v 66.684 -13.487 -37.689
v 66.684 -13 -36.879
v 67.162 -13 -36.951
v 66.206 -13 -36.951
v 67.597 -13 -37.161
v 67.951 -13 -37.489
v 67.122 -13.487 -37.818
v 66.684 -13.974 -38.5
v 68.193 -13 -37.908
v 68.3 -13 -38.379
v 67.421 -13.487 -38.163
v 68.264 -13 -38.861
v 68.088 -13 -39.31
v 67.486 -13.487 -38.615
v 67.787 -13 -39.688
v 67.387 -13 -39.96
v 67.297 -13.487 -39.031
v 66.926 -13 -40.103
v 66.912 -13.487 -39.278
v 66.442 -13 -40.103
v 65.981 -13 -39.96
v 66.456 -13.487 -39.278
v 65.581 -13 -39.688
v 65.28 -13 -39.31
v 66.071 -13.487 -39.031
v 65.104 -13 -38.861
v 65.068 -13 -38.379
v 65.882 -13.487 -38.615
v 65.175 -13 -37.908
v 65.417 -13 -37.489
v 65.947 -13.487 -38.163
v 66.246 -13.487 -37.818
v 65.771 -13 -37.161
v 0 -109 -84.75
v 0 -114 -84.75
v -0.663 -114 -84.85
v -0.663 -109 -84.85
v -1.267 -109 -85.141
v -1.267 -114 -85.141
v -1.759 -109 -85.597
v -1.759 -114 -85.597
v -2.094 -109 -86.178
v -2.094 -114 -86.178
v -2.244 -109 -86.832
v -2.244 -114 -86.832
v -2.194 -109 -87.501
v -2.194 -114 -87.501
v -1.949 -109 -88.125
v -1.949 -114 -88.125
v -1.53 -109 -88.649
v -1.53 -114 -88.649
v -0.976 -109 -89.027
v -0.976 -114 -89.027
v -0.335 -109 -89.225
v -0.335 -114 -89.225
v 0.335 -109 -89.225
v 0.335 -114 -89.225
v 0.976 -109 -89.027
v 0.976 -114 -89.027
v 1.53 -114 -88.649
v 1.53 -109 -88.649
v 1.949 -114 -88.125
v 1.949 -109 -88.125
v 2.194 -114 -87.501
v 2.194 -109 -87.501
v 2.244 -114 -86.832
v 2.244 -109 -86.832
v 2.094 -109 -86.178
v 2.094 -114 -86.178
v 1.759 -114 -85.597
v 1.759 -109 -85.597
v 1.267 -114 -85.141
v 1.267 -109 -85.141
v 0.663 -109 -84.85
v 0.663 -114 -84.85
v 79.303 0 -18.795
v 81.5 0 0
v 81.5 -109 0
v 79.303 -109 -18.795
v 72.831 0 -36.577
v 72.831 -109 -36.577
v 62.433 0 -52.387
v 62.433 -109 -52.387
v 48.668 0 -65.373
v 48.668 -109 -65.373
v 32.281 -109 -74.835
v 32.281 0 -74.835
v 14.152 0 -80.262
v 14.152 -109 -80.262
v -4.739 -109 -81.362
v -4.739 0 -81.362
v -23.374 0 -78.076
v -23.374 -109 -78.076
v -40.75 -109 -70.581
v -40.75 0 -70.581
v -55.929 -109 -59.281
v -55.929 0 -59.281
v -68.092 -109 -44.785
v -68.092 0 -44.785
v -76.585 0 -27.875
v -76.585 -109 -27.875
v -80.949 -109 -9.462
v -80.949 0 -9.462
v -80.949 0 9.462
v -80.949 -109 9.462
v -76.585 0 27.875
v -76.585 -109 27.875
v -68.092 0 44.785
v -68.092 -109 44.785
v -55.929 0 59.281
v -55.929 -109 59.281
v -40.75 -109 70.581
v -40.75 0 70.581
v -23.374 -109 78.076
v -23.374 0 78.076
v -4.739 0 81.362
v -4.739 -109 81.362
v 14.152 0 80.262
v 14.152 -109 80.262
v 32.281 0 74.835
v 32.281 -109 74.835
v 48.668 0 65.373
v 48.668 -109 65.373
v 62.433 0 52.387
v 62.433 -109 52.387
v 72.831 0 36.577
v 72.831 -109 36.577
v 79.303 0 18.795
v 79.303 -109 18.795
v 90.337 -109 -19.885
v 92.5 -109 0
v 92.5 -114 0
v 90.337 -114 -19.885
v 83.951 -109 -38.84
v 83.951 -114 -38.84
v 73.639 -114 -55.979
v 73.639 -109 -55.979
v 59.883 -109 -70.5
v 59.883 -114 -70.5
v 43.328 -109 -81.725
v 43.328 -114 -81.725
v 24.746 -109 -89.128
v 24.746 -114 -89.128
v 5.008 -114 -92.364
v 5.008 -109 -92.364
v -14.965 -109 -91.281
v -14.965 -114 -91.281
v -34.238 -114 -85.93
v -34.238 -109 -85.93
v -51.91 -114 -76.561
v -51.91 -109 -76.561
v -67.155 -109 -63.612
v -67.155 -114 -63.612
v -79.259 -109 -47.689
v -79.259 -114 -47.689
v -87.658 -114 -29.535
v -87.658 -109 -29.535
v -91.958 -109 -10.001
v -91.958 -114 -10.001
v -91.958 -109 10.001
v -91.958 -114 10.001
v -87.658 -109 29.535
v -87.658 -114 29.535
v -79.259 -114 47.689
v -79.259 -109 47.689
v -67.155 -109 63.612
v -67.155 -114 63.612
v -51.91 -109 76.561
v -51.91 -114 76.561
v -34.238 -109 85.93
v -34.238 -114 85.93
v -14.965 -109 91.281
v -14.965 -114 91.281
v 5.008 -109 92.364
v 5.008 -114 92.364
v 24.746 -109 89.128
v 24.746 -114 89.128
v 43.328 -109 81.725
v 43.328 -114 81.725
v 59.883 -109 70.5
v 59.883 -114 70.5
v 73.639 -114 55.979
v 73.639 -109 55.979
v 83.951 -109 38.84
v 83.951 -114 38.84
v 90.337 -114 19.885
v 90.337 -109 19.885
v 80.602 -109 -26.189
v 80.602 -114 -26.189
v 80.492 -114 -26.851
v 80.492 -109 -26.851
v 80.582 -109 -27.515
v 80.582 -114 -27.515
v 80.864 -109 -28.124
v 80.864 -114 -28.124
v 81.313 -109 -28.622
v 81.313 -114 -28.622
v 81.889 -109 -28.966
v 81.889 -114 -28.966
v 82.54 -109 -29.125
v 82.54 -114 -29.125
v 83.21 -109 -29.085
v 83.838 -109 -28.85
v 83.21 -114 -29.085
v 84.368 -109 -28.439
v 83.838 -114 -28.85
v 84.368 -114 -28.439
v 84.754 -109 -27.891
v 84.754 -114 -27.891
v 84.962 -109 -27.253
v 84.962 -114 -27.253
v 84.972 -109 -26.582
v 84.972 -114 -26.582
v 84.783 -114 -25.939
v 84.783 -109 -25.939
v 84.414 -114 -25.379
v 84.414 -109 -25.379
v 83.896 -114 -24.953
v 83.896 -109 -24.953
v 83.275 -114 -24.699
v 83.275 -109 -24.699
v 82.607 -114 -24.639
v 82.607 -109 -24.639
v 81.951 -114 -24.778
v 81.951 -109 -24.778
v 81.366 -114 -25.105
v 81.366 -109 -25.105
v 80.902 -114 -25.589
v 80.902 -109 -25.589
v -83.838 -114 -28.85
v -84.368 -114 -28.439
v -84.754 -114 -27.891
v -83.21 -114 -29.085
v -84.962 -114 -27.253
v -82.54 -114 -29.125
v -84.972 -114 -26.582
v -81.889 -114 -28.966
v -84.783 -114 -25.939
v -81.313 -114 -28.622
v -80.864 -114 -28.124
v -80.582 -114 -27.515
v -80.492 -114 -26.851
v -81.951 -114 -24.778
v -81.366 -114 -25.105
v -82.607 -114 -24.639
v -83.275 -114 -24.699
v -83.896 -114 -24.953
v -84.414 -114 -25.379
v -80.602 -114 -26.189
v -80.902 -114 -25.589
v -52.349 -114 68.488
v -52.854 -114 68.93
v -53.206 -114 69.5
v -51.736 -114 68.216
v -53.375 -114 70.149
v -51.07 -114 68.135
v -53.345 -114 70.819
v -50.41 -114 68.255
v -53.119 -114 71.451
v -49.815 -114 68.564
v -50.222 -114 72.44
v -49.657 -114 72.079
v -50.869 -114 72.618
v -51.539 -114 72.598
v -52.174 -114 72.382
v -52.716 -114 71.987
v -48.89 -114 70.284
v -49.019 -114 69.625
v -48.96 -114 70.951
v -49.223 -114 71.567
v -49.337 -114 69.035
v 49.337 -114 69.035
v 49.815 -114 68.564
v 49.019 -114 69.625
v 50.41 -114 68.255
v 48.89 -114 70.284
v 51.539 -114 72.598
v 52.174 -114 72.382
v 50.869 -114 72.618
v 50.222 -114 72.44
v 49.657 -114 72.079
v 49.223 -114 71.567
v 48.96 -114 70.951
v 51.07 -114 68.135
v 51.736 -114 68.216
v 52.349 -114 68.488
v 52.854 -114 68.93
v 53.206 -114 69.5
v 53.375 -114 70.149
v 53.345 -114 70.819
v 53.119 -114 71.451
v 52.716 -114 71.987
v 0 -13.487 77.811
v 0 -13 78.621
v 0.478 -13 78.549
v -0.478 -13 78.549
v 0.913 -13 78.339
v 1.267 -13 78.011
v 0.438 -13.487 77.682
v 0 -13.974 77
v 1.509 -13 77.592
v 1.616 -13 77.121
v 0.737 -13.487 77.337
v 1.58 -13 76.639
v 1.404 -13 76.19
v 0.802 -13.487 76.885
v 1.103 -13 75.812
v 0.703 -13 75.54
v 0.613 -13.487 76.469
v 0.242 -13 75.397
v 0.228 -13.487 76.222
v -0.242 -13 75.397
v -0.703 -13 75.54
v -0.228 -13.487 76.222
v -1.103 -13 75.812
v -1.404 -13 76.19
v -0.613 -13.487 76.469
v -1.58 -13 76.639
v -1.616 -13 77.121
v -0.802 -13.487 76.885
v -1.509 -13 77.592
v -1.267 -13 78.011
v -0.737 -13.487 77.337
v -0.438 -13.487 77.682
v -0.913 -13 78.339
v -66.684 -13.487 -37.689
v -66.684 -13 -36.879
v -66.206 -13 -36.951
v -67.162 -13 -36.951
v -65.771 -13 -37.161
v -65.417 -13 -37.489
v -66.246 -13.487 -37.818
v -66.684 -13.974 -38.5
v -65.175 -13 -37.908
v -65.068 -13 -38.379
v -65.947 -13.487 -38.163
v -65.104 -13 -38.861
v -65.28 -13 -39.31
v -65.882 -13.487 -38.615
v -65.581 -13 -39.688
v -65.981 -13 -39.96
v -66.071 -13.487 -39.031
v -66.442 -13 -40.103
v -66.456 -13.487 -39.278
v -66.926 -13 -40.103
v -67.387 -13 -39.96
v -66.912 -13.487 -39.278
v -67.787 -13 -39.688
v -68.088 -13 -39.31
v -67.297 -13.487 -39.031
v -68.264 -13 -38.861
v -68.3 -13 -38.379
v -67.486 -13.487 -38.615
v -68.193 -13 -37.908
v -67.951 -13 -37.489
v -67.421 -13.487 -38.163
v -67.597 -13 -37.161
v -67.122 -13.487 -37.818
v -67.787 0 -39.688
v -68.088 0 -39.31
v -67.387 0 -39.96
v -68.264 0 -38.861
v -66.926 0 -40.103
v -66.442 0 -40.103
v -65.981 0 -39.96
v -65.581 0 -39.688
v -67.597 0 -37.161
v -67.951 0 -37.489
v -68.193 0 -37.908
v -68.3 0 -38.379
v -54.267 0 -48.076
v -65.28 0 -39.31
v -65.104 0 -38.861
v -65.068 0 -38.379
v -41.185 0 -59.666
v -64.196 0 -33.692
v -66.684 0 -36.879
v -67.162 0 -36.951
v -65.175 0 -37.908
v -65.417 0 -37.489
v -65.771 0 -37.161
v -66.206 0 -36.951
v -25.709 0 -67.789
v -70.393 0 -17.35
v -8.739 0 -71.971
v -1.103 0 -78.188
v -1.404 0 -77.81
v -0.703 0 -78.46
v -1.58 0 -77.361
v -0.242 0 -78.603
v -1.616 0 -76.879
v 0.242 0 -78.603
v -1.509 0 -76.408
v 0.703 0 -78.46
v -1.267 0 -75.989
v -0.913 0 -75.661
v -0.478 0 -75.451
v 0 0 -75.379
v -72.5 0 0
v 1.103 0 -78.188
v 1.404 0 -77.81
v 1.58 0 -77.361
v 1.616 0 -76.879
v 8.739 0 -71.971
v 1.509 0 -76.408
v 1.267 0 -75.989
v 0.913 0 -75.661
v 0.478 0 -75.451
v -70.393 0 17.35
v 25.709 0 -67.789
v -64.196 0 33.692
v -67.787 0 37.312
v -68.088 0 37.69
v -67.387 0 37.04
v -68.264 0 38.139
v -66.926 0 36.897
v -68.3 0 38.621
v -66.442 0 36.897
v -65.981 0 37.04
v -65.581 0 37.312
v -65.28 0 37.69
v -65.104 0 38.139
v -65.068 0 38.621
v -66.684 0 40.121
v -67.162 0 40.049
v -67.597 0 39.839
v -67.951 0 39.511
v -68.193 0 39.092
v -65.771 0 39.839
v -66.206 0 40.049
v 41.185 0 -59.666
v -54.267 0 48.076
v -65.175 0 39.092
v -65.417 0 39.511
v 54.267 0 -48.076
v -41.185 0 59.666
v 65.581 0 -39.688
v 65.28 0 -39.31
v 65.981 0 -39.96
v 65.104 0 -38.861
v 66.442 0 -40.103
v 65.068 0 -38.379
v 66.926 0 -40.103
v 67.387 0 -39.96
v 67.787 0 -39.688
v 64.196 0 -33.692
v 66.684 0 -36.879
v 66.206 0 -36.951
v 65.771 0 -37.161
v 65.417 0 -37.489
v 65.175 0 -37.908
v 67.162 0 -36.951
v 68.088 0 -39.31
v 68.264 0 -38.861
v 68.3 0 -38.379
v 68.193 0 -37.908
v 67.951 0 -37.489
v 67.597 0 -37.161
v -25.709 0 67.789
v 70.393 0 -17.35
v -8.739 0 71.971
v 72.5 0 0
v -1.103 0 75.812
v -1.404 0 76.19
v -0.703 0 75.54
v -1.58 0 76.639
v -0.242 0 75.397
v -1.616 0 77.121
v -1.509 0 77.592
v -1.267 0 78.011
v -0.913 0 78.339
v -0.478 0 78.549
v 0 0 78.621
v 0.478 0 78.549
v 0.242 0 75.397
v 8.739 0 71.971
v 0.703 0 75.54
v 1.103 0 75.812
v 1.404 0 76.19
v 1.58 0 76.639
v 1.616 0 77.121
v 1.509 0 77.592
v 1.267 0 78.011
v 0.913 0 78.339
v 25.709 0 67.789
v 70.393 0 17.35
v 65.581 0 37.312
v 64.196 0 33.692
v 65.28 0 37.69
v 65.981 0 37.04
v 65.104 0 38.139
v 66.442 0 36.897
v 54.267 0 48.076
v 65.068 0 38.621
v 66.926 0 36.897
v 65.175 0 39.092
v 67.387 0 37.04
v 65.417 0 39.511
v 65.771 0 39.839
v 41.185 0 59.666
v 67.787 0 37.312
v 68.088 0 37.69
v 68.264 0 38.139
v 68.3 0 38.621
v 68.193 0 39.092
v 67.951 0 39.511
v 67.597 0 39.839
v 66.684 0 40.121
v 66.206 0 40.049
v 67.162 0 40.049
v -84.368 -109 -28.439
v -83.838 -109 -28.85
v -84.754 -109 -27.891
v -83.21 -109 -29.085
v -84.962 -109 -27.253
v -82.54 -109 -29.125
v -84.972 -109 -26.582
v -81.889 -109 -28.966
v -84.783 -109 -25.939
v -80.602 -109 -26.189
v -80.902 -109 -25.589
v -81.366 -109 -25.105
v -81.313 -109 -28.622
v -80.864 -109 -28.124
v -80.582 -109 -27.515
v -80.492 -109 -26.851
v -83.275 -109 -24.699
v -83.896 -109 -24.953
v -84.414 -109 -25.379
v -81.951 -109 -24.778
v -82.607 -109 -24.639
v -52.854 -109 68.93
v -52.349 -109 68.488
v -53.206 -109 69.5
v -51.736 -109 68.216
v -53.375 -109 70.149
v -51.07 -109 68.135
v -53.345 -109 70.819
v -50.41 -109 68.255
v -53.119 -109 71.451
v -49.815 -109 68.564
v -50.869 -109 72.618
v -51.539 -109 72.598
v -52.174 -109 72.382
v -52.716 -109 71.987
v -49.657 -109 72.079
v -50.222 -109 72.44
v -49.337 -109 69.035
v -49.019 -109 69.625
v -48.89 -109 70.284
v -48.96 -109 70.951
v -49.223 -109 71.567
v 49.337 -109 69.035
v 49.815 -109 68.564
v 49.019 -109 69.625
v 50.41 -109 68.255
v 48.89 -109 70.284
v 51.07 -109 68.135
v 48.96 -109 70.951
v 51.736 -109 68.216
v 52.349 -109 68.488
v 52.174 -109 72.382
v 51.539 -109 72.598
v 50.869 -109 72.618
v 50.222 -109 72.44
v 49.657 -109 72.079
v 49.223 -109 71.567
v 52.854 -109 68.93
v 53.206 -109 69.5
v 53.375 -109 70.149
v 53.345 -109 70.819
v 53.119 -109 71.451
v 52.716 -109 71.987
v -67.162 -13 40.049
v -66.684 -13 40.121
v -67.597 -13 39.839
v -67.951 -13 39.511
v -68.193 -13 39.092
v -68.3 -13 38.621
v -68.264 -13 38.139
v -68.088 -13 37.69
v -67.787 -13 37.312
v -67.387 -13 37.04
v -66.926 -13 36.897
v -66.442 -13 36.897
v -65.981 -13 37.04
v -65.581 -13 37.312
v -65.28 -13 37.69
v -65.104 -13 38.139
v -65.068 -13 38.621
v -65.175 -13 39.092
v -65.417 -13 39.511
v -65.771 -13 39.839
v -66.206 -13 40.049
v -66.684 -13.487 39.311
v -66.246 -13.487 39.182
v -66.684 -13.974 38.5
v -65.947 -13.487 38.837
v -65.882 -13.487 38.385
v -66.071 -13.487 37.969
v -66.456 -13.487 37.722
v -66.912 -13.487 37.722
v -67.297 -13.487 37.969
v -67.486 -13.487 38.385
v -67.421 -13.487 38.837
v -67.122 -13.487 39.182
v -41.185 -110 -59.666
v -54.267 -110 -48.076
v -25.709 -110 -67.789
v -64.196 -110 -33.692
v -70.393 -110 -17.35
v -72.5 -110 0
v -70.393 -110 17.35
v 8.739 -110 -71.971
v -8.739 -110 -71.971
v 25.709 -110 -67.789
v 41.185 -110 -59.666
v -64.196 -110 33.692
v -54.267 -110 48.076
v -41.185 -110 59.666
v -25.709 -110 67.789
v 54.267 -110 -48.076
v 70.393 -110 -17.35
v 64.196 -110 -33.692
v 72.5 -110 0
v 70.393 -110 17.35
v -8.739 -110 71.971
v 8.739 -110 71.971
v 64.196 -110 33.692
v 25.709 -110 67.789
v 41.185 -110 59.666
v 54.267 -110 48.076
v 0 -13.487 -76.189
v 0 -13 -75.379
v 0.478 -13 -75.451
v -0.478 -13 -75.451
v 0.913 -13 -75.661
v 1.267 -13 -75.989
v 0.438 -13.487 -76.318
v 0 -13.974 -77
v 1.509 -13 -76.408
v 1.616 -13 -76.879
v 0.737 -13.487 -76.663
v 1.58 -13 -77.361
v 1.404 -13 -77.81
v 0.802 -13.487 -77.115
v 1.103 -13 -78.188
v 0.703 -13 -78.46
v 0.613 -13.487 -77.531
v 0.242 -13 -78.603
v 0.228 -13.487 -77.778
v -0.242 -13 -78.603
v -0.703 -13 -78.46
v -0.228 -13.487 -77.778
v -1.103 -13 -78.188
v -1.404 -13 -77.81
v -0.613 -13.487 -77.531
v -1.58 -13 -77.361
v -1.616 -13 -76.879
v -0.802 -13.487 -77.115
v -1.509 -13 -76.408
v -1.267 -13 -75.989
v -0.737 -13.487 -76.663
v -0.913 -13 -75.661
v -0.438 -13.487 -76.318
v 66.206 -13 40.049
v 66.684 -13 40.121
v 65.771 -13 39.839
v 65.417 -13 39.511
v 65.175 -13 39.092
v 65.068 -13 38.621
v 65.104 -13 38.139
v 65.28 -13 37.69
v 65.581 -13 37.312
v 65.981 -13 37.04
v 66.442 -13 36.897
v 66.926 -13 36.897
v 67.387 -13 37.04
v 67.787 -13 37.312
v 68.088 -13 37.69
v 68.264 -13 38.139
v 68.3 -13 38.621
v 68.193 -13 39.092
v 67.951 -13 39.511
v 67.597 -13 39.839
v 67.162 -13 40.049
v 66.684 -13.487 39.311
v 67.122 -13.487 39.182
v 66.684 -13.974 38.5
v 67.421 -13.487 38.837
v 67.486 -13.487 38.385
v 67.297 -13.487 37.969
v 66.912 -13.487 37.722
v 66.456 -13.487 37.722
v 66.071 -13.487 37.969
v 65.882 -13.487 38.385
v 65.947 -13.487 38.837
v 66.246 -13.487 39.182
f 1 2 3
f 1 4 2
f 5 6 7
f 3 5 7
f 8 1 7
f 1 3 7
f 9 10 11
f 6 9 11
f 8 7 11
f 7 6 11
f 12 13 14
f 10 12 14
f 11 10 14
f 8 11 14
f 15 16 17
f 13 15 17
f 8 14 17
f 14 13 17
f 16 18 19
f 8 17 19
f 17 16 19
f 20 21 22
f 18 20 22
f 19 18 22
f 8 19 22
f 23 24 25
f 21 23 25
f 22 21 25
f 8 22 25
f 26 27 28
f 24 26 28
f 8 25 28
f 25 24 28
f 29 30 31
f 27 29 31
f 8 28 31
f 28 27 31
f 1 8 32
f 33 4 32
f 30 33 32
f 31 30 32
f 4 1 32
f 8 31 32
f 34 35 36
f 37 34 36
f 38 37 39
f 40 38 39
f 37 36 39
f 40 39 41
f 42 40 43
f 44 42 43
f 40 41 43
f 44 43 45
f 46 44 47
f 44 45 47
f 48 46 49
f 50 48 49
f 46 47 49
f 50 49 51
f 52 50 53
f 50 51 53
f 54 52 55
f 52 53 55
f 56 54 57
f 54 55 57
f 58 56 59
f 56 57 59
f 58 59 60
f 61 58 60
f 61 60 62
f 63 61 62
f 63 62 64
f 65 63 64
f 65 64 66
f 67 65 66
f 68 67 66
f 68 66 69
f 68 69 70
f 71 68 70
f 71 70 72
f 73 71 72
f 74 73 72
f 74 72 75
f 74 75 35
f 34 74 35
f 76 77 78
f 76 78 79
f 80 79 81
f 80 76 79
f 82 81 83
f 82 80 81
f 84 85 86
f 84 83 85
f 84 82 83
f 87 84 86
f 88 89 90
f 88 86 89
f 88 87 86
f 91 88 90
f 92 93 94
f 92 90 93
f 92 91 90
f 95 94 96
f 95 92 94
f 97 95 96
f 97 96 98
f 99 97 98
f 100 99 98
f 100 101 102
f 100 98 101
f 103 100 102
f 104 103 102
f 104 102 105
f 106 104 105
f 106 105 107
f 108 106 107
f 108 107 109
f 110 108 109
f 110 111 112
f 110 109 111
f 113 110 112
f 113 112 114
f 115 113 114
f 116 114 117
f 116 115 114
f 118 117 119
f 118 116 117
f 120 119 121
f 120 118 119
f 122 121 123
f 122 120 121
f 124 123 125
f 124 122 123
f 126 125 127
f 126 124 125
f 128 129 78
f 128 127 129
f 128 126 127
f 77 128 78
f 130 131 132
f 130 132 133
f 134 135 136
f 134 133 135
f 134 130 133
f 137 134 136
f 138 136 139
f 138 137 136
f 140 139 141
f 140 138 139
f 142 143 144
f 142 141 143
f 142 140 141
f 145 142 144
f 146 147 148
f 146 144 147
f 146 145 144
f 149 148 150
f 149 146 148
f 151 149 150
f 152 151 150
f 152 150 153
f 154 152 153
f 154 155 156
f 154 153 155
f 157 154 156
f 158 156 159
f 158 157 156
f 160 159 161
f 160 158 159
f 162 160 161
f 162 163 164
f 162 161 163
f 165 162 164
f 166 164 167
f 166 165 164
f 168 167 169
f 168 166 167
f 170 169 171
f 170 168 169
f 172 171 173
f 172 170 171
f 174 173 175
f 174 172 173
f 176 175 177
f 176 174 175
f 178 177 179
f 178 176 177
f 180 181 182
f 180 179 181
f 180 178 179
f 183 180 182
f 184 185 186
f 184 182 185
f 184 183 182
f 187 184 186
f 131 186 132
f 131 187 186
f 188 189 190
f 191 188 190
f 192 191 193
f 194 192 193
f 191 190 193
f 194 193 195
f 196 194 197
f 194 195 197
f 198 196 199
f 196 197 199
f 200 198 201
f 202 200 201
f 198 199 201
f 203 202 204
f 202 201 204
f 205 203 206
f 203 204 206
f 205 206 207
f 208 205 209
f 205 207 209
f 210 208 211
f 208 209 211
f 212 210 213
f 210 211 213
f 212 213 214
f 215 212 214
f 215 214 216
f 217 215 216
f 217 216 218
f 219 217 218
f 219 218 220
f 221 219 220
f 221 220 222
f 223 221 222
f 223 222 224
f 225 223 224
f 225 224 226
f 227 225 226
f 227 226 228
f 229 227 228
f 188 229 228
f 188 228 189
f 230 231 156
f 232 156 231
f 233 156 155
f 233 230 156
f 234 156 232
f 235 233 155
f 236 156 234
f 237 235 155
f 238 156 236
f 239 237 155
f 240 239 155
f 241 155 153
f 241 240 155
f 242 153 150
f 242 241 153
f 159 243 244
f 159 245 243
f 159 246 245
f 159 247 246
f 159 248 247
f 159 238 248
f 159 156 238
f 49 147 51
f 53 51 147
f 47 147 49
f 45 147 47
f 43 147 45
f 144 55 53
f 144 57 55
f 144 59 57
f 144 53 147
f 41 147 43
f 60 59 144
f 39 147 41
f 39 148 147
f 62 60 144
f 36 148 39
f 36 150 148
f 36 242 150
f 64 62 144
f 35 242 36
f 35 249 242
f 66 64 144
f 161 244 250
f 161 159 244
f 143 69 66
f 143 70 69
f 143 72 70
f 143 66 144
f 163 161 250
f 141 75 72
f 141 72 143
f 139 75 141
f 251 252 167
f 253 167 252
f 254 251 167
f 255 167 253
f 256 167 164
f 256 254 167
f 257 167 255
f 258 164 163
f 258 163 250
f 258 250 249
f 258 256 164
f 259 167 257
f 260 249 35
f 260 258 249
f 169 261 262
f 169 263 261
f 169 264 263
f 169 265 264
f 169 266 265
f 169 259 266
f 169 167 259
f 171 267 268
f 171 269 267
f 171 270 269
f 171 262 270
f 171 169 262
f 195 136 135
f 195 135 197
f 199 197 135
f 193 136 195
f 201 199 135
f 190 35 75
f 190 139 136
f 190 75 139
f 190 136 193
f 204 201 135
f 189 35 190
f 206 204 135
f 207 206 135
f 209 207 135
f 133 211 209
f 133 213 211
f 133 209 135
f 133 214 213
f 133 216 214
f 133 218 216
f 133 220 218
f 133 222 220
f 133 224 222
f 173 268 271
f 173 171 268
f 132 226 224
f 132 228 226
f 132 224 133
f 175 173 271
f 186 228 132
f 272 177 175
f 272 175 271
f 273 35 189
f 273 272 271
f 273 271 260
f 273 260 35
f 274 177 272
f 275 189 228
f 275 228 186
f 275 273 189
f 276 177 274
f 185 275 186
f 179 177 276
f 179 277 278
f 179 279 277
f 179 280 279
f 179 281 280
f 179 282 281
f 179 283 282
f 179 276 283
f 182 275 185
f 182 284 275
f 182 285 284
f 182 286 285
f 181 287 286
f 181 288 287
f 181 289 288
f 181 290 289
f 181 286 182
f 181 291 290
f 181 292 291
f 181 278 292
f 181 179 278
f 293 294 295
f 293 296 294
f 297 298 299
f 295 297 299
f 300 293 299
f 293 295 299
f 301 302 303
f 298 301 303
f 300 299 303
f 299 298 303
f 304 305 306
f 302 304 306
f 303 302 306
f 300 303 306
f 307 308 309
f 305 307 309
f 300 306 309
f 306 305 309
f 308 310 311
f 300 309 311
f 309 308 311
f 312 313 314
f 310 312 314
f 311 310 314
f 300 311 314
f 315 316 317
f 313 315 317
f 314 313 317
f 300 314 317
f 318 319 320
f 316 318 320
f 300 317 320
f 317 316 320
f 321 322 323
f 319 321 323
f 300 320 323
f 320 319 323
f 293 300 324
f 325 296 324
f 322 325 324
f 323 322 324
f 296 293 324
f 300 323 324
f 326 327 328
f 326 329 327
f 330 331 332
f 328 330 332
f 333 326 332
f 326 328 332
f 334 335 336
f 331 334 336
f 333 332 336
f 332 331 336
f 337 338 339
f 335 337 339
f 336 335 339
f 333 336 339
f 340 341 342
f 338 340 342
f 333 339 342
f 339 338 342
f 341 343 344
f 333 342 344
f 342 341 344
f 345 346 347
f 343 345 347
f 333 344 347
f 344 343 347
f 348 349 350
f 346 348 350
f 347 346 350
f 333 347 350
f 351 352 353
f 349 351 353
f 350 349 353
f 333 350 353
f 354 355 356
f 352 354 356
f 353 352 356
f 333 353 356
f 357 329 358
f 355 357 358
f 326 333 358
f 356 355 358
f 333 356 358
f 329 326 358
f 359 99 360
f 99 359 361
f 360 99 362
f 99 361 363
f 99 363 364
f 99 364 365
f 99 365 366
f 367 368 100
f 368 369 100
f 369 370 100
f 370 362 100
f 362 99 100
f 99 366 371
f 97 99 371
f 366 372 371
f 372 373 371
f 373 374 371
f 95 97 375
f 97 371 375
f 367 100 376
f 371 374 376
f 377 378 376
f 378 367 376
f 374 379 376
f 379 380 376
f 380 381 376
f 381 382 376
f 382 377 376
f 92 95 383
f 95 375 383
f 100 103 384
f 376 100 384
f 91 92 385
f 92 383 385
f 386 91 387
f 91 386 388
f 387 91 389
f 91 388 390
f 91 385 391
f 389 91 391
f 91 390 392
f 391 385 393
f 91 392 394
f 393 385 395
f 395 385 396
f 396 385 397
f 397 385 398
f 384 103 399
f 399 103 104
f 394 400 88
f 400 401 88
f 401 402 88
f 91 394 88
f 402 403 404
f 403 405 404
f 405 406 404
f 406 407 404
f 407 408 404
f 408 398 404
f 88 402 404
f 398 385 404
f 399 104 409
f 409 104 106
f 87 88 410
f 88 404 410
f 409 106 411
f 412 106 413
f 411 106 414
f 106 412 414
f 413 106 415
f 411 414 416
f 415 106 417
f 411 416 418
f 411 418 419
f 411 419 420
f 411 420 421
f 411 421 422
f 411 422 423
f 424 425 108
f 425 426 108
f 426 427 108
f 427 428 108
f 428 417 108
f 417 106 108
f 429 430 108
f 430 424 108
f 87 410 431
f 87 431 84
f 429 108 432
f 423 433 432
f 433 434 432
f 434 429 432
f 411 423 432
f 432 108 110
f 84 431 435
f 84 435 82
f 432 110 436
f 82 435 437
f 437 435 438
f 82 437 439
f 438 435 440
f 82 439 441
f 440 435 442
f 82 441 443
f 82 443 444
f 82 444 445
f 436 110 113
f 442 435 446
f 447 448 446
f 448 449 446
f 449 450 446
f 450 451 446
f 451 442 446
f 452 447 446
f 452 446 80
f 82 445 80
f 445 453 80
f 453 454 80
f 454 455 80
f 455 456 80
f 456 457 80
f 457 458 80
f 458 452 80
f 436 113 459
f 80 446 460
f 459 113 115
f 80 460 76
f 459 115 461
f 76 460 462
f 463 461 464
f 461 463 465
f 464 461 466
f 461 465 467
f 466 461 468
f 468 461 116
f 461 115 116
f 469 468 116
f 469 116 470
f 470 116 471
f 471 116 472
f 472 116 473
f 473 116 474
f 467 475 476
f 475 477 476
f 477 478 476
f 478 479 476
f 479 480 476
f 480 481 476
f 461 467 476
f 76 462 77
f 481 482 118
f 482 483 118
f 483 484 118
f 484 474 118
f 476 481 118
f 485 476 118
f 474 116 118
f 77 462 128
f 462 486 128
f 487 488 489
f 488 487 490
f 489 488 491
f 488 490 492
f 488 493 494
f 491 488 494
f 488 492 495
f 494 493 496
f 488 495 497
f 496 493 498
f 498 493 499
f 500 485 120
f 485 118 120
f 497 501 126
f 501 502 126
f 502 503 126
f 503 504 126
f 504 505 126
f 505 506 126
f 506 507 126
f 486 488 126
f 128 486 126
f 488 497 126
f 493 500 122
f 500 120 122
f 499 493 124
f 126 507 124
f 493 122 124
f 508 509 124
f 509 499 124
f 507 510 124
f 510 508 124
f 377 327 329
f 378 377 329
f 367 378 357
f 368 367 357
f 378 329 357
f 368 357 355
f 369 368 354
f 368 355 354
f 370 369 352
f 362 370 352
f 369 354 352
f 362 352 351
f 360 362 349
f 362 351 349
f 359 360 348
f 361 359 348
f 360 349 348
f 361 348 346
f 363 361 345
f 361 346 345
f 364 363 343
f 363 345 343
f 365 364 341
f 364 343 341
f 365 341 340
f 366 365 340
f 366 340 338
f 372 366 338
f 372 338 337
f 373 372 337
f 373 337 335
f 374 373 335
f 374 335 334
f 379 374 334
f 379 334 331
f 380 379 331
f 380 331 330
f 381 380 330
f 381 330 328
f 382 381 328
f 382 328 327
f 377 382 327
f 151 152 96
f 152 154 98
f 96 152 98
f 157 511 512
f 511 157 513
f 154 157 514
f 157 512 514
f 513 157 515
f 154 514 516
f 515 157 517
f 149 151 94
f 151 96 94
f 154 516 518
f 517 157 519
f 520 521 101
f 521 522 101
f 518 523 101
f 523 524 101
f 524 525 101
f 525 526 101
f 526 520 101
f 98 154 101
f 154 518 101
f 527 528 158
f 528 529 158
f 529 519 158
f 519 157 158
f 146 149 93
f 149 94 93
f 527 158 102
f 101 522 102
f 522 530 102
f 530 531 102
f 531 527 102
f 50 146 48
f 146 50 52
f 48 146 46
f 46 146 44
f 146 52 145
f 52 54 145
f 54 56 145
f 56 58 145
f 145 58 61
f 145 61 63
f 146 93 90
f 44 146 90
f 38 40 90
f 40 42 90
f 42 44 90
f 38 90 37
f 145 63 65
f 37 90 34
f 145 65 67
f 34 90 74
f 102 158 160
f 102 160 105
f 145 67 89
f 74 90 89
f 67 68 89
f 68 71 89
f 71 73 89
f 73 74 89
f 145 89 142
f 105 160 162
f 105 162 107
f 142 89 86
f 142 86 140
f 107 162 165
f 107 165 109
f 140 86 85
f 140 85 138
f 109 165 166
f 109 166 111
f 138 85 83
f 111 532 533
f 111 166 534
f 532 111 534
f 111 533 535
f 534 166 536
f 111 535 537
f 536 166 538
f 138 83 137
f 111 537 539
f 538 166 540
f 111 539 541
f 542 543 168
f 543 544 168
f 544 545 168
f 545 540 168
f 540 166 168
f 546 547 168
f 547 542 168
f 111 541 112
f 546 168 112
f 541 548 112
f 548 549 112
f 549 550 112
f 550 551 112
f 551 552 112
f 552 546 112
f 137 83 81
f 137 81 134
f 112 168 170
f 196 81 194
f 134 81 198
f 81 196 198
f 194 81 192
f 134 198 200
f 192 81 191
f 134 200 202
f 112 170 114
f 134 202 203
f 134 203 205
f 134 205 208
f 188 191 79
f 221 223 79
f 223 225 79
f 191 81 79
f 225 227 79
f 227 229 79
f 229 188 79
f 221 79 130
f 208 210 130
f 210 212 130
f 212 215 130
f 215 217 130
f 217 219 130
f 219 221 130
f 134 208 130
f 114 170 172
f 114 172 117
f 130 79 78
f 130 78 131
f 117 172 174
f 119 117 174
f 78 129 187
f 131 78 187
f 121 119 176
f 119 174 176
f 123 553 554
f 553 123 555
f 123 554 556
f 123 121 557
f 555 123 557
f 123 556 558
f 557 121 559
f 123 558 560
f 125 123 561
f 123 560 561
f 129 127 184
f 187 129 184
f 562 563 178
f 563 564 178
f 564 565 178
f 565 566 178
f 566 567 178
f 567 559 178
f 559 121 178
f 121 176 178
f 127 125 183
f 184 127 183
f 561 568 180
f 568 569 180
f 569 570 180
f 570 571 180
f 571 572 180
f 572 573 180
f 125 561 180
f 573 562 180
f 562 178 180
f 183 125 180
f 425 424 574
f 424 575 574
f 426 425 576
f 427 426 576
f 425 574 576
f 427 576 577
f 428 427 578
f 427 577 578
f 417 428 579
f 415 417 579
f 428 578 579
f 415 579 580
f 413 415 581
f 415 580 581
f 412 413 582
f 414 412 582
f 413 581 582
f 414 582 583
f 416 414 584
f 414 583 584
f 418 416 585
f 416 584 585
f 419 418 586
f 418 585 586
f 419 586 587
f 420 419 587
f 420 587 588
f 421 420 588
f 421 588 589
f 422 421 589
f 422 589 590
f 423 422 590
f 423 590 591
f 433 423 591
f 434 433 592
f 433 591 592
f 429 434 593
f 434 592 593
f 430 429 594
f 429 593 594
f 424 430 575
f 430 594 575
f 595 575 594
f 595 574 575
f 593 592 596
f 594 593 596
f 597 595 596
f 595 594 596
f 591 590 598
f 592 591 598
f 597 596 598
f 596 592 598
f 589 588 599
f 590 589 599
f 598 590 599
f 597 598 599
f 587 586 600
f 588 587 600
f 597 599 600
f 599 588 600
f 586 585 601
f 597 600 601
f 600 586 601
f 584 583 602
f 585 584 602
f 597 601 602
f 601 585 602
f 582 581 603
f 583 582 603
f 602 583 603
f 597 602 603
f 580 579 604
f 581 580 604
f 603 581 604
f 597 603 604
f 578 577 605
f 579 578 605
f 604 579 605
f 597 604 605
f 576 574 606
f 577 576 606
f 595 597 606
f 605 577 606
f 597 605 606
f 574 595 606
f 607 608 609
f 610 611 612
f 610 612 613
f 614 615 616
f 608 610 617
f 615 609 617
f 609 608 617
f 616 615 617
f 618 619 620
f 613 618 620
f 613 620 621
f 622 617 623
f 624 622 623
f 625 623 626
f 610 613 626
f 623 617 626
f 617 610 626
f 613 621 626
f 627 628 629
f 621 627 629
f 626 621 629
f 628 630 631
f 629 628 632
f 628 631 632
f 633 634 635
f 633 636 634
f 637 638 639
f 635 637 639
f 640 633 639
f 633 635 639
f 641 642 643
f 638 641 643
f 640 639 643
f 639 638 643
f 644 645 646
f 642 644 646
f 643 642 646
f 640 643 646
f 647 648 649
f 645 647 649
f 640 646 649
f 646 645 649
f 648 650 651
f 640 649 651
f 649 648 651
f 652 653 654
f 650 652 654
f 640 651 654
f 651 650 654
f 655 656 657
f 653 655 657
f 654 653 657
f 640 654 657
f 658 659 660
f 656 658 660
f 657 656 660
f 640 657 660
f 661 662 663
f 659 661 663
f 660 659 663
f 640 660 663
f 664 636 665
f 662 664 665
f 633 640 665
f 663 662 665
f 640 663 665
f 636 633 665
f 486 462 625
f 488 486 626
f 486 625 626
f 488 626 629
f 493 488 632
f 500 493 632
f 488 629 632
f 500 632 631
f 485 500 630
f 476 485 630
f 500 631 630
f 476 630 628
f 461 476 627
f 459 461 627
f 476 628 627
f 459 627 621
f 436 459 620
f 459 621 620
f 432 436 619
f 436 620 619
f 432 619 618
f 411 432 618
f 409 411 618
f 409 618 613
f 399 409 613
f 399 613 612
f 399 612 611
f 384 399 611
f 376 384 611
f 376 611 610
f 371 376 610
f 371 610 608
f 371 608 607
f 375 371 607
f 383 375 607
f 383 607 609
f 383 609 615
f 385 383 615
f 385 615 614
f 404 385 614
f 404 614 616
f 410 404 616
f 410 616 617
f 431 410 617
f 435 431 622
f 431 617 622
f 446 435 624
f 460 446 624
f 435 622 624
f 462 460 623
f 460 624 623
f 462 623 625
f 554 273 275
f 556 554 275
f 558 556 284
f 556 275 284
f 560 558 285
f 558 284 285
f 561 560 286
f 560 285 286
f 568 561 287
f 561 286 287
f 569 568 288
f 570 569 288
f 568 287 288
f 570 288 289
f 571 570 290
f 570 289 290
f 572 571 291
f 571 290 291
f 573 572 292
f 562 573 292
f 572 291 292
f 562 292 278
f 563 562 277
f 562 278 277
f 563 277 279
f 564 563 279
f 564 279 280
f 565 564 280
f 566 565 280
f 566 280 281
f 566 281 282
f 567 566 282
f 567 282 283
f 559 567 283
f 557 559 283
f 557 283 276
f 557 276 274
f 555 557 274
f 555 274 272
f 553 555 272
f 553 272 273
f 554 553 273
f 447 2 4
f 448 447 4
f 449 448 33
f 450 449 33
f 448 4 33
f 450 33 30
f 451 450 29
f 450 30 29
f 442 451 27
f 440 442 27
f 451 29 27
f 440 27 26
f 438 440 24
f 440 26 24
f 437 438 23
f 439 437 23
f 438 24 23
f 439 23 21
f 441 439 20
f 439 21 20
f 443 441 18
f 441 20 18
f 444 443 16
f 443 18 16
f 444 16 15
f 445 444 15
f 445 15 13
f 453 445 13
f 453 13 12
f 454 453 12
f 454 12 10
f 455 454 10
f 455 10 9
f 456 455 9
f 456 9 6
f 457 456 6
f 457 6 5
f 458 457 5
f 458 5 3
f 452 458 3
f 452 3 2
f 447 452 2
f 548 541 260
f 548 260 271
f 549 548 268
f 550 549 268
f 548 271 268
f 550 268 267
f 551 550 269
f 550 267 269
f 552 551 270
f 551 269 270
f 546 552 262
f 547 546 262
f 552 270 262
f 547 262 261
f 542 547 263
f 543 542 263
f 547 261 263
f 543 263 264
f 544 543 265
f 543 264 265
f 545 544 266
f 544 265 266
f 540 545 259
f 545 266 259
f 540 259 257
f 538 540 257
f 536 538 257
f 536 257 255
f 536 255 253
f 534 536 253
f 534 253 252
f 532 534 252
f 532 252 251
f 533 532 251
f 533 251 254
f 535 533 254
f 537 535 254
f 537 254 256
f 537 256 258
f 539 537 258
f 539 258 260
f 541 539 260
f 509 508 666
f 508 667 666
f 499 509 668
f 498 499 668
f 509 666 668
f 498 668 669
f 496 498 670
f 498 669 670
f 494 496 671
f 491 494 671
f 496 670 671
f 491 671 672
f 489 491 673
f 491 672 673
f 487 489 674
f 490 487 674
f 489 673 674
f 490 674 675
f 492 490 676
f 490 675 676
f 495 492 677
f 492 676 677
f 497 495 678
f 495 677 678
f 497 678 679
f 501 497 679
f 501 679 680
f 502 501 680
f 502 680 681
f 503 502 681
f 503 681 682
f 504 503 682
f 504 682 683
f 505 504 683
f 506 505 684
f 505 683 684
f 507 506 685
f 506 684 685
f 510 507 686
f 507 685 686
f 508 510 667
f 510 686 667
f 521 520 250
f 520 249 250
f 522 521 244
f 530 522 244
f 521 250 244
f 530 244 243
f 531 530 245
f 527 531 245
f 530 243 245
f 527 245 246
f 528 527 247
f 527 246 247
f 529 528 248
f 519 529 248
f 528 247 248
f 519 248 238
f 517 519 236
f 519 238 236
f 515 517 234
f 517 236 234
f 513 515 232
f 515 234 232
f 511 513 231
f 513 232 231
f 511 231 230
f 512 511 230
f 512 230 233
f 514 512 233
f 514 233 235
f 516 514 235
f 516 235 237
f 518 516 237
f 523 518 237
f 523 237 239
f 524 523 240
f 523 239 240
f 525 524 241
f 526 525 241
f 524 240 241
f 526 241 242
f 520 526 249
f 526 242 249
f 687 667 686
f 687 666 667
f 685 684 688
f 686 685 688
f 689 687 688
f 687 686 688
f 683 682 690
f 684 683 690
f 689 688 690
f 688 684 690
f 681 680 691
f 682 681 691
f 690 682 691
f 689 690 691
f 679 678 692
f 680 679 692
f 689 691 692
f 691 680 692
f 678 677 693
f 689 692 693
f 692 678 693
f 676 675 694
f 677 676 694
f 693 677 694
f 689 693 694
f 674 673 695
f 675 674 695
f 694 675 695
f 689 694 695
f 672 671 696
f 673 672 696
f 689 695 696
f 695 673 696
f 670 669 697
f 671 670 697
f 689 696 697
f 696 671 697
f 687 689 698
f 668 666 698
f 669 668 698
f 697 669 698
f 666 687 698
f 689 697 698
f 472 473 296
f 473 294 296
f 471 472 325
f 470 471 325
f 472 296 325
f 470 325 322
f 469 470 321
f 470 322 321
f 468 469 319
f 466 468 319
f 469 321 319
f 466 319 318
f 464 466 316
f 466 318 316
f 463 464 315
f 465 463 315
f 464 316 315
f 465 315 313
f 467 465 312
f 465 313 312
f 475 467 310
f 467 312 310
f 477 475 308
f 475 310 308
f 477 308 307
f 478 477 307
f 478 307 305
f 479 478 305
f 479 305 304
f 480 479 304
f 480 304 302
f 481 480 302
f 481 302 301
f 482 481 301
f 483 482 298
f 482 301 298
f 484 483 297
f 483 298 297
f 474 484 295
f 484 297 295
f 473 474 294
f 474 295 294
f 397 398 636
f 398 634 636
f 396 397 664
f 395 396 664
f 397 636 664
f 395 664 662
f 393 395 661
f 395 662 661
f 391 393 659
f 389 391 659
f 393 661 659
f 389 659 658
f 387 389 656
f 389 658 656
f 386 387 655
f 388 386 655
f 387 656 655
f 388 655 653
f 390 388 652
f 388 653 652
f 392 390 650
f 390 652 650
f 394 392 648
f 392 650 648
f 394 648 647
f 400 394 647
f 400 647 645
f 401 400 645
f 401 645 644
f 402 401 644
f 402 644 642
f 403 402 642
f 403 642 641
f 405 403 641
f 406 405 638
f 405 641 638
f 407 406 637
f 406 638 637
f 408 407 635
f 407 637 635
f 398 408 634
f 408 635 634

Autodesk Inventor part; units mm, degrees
ref_plane "YZ Plane" through (0, 0, 0) normal (1, 0, 0) x (0, 1, 0)
ref_plane "XZ Plane" through (0, 0, 0) normal (0, 1, 0) x (-1, 0, 0)
ref_plane "XY Plane" through (0, 0, 0) normal (0, 0, 1) x (1, 0, 0)
sketch "Sketch2" plane through (0, 0, 0) normal (0, 0, 1) x (-1, 0, 0)
  line L0 (0, -22.8) -> (0, 136.8) construction
  line L1 (0, 114) -> (-92.5, 114)
  line L2 (-92.5, 114) -> (-92.5, 109)
  line L3 (-92.5, 109) -> (-81.5, 109)
  line L4 (-81.5, 109) -> (-81.5, 0)
  line L5 (-81.5, 0) -> (-72.5, 0)
  line L6 (-72.5, 0) -> (-72.5, 110)
  line L7 (-72.5, 110) -> (0, 110)
  line L8 (0, 114) -> (0, 110)
  line L9 (18.5, 0) -> (-111, 0) construction
  point P0 (0, 0)
  dimension "d4" = 5
  dimension "d5" = 11
  dimension "d6" = 9
  dimension "d8" = 110
  dimension "d9" = 4
  dimension "d38" = 81.5
revolve "Revolution1" add sketch "Sketch2" angle 360 about axis through (0, 0, 0) along (0, -1, 0)
sketch "Sketch3" plane through (0, -109, 0) normal (0, 1, 0) x (1, 0, 0)
  line L0 (0, 129.5) -> (0, -129.5) construction
  line L1 (129.5, 0) -> (-129.5, 0) construction
  circle A0 centre (0, 0) radius 87 construction
  circle A1 centre (0, 0) radius 81.5 construction
  circle A2 centre (0, 0) radius 92.5 construction
  point P0 (0, 87)
  dimension "d11" = 5.5
  dimension "d12" = 5.5
hole "Hole1" at (0, -109, -87) direction (0, -1, 0) diameter 4.5 end through all clearance for "Flat Head Machine Screw" size "M4" standard "Ansi Metric M Profile"
pattern_circular "Circular Pattern1" count 5 over 360 about axis through (0, -10, 0) along (0, 1, 0) of "Hole1"
sketch "Sketch5" plane through (0, 0, 0) normal (0, 1, 0) x (1, 0, 0)
  line L0 (0, 129.5) -> (0, -129.5) construction
  line L1 (129.5, 0) -> (-129.5, 0) construction
  circle A0 centre (0, 0) radius 77 construction
  circle A1 centre (0, 0) radius 72.5 construction
  circle A2 centre (0, 0) radius 81.5 construction
  point P0 (0, 77)
  point P1 (-66.684, 38.5)
  point P2 (-66.684, -38.5)
  point P3 (0, -77)
  point P4 (66.684, -38.5)
  point P5 (66.684, 38.5)
  dimension "d39" = 4.5
  dimension "d40" = 4.5
  dimension "d43" = 360
hole "Hole2" at (0, 0, -77) at (-66.684, 0, -38.5) at (-66.684, 0, 38.5) at (0, 0, 77) at (66.684, 0, 38.5) at (66.684, 0, -38.5) direction (0, -1, 0) diameter 3.242 depth 13 tip angle 118 thread size "M4x0.7" class "6H" standard "ANSI Metric M Profile"
equation "\"d11\" = d12"
equation "\"d39\" = d40"
properties part number "Base" material "Aluminum 6061"
